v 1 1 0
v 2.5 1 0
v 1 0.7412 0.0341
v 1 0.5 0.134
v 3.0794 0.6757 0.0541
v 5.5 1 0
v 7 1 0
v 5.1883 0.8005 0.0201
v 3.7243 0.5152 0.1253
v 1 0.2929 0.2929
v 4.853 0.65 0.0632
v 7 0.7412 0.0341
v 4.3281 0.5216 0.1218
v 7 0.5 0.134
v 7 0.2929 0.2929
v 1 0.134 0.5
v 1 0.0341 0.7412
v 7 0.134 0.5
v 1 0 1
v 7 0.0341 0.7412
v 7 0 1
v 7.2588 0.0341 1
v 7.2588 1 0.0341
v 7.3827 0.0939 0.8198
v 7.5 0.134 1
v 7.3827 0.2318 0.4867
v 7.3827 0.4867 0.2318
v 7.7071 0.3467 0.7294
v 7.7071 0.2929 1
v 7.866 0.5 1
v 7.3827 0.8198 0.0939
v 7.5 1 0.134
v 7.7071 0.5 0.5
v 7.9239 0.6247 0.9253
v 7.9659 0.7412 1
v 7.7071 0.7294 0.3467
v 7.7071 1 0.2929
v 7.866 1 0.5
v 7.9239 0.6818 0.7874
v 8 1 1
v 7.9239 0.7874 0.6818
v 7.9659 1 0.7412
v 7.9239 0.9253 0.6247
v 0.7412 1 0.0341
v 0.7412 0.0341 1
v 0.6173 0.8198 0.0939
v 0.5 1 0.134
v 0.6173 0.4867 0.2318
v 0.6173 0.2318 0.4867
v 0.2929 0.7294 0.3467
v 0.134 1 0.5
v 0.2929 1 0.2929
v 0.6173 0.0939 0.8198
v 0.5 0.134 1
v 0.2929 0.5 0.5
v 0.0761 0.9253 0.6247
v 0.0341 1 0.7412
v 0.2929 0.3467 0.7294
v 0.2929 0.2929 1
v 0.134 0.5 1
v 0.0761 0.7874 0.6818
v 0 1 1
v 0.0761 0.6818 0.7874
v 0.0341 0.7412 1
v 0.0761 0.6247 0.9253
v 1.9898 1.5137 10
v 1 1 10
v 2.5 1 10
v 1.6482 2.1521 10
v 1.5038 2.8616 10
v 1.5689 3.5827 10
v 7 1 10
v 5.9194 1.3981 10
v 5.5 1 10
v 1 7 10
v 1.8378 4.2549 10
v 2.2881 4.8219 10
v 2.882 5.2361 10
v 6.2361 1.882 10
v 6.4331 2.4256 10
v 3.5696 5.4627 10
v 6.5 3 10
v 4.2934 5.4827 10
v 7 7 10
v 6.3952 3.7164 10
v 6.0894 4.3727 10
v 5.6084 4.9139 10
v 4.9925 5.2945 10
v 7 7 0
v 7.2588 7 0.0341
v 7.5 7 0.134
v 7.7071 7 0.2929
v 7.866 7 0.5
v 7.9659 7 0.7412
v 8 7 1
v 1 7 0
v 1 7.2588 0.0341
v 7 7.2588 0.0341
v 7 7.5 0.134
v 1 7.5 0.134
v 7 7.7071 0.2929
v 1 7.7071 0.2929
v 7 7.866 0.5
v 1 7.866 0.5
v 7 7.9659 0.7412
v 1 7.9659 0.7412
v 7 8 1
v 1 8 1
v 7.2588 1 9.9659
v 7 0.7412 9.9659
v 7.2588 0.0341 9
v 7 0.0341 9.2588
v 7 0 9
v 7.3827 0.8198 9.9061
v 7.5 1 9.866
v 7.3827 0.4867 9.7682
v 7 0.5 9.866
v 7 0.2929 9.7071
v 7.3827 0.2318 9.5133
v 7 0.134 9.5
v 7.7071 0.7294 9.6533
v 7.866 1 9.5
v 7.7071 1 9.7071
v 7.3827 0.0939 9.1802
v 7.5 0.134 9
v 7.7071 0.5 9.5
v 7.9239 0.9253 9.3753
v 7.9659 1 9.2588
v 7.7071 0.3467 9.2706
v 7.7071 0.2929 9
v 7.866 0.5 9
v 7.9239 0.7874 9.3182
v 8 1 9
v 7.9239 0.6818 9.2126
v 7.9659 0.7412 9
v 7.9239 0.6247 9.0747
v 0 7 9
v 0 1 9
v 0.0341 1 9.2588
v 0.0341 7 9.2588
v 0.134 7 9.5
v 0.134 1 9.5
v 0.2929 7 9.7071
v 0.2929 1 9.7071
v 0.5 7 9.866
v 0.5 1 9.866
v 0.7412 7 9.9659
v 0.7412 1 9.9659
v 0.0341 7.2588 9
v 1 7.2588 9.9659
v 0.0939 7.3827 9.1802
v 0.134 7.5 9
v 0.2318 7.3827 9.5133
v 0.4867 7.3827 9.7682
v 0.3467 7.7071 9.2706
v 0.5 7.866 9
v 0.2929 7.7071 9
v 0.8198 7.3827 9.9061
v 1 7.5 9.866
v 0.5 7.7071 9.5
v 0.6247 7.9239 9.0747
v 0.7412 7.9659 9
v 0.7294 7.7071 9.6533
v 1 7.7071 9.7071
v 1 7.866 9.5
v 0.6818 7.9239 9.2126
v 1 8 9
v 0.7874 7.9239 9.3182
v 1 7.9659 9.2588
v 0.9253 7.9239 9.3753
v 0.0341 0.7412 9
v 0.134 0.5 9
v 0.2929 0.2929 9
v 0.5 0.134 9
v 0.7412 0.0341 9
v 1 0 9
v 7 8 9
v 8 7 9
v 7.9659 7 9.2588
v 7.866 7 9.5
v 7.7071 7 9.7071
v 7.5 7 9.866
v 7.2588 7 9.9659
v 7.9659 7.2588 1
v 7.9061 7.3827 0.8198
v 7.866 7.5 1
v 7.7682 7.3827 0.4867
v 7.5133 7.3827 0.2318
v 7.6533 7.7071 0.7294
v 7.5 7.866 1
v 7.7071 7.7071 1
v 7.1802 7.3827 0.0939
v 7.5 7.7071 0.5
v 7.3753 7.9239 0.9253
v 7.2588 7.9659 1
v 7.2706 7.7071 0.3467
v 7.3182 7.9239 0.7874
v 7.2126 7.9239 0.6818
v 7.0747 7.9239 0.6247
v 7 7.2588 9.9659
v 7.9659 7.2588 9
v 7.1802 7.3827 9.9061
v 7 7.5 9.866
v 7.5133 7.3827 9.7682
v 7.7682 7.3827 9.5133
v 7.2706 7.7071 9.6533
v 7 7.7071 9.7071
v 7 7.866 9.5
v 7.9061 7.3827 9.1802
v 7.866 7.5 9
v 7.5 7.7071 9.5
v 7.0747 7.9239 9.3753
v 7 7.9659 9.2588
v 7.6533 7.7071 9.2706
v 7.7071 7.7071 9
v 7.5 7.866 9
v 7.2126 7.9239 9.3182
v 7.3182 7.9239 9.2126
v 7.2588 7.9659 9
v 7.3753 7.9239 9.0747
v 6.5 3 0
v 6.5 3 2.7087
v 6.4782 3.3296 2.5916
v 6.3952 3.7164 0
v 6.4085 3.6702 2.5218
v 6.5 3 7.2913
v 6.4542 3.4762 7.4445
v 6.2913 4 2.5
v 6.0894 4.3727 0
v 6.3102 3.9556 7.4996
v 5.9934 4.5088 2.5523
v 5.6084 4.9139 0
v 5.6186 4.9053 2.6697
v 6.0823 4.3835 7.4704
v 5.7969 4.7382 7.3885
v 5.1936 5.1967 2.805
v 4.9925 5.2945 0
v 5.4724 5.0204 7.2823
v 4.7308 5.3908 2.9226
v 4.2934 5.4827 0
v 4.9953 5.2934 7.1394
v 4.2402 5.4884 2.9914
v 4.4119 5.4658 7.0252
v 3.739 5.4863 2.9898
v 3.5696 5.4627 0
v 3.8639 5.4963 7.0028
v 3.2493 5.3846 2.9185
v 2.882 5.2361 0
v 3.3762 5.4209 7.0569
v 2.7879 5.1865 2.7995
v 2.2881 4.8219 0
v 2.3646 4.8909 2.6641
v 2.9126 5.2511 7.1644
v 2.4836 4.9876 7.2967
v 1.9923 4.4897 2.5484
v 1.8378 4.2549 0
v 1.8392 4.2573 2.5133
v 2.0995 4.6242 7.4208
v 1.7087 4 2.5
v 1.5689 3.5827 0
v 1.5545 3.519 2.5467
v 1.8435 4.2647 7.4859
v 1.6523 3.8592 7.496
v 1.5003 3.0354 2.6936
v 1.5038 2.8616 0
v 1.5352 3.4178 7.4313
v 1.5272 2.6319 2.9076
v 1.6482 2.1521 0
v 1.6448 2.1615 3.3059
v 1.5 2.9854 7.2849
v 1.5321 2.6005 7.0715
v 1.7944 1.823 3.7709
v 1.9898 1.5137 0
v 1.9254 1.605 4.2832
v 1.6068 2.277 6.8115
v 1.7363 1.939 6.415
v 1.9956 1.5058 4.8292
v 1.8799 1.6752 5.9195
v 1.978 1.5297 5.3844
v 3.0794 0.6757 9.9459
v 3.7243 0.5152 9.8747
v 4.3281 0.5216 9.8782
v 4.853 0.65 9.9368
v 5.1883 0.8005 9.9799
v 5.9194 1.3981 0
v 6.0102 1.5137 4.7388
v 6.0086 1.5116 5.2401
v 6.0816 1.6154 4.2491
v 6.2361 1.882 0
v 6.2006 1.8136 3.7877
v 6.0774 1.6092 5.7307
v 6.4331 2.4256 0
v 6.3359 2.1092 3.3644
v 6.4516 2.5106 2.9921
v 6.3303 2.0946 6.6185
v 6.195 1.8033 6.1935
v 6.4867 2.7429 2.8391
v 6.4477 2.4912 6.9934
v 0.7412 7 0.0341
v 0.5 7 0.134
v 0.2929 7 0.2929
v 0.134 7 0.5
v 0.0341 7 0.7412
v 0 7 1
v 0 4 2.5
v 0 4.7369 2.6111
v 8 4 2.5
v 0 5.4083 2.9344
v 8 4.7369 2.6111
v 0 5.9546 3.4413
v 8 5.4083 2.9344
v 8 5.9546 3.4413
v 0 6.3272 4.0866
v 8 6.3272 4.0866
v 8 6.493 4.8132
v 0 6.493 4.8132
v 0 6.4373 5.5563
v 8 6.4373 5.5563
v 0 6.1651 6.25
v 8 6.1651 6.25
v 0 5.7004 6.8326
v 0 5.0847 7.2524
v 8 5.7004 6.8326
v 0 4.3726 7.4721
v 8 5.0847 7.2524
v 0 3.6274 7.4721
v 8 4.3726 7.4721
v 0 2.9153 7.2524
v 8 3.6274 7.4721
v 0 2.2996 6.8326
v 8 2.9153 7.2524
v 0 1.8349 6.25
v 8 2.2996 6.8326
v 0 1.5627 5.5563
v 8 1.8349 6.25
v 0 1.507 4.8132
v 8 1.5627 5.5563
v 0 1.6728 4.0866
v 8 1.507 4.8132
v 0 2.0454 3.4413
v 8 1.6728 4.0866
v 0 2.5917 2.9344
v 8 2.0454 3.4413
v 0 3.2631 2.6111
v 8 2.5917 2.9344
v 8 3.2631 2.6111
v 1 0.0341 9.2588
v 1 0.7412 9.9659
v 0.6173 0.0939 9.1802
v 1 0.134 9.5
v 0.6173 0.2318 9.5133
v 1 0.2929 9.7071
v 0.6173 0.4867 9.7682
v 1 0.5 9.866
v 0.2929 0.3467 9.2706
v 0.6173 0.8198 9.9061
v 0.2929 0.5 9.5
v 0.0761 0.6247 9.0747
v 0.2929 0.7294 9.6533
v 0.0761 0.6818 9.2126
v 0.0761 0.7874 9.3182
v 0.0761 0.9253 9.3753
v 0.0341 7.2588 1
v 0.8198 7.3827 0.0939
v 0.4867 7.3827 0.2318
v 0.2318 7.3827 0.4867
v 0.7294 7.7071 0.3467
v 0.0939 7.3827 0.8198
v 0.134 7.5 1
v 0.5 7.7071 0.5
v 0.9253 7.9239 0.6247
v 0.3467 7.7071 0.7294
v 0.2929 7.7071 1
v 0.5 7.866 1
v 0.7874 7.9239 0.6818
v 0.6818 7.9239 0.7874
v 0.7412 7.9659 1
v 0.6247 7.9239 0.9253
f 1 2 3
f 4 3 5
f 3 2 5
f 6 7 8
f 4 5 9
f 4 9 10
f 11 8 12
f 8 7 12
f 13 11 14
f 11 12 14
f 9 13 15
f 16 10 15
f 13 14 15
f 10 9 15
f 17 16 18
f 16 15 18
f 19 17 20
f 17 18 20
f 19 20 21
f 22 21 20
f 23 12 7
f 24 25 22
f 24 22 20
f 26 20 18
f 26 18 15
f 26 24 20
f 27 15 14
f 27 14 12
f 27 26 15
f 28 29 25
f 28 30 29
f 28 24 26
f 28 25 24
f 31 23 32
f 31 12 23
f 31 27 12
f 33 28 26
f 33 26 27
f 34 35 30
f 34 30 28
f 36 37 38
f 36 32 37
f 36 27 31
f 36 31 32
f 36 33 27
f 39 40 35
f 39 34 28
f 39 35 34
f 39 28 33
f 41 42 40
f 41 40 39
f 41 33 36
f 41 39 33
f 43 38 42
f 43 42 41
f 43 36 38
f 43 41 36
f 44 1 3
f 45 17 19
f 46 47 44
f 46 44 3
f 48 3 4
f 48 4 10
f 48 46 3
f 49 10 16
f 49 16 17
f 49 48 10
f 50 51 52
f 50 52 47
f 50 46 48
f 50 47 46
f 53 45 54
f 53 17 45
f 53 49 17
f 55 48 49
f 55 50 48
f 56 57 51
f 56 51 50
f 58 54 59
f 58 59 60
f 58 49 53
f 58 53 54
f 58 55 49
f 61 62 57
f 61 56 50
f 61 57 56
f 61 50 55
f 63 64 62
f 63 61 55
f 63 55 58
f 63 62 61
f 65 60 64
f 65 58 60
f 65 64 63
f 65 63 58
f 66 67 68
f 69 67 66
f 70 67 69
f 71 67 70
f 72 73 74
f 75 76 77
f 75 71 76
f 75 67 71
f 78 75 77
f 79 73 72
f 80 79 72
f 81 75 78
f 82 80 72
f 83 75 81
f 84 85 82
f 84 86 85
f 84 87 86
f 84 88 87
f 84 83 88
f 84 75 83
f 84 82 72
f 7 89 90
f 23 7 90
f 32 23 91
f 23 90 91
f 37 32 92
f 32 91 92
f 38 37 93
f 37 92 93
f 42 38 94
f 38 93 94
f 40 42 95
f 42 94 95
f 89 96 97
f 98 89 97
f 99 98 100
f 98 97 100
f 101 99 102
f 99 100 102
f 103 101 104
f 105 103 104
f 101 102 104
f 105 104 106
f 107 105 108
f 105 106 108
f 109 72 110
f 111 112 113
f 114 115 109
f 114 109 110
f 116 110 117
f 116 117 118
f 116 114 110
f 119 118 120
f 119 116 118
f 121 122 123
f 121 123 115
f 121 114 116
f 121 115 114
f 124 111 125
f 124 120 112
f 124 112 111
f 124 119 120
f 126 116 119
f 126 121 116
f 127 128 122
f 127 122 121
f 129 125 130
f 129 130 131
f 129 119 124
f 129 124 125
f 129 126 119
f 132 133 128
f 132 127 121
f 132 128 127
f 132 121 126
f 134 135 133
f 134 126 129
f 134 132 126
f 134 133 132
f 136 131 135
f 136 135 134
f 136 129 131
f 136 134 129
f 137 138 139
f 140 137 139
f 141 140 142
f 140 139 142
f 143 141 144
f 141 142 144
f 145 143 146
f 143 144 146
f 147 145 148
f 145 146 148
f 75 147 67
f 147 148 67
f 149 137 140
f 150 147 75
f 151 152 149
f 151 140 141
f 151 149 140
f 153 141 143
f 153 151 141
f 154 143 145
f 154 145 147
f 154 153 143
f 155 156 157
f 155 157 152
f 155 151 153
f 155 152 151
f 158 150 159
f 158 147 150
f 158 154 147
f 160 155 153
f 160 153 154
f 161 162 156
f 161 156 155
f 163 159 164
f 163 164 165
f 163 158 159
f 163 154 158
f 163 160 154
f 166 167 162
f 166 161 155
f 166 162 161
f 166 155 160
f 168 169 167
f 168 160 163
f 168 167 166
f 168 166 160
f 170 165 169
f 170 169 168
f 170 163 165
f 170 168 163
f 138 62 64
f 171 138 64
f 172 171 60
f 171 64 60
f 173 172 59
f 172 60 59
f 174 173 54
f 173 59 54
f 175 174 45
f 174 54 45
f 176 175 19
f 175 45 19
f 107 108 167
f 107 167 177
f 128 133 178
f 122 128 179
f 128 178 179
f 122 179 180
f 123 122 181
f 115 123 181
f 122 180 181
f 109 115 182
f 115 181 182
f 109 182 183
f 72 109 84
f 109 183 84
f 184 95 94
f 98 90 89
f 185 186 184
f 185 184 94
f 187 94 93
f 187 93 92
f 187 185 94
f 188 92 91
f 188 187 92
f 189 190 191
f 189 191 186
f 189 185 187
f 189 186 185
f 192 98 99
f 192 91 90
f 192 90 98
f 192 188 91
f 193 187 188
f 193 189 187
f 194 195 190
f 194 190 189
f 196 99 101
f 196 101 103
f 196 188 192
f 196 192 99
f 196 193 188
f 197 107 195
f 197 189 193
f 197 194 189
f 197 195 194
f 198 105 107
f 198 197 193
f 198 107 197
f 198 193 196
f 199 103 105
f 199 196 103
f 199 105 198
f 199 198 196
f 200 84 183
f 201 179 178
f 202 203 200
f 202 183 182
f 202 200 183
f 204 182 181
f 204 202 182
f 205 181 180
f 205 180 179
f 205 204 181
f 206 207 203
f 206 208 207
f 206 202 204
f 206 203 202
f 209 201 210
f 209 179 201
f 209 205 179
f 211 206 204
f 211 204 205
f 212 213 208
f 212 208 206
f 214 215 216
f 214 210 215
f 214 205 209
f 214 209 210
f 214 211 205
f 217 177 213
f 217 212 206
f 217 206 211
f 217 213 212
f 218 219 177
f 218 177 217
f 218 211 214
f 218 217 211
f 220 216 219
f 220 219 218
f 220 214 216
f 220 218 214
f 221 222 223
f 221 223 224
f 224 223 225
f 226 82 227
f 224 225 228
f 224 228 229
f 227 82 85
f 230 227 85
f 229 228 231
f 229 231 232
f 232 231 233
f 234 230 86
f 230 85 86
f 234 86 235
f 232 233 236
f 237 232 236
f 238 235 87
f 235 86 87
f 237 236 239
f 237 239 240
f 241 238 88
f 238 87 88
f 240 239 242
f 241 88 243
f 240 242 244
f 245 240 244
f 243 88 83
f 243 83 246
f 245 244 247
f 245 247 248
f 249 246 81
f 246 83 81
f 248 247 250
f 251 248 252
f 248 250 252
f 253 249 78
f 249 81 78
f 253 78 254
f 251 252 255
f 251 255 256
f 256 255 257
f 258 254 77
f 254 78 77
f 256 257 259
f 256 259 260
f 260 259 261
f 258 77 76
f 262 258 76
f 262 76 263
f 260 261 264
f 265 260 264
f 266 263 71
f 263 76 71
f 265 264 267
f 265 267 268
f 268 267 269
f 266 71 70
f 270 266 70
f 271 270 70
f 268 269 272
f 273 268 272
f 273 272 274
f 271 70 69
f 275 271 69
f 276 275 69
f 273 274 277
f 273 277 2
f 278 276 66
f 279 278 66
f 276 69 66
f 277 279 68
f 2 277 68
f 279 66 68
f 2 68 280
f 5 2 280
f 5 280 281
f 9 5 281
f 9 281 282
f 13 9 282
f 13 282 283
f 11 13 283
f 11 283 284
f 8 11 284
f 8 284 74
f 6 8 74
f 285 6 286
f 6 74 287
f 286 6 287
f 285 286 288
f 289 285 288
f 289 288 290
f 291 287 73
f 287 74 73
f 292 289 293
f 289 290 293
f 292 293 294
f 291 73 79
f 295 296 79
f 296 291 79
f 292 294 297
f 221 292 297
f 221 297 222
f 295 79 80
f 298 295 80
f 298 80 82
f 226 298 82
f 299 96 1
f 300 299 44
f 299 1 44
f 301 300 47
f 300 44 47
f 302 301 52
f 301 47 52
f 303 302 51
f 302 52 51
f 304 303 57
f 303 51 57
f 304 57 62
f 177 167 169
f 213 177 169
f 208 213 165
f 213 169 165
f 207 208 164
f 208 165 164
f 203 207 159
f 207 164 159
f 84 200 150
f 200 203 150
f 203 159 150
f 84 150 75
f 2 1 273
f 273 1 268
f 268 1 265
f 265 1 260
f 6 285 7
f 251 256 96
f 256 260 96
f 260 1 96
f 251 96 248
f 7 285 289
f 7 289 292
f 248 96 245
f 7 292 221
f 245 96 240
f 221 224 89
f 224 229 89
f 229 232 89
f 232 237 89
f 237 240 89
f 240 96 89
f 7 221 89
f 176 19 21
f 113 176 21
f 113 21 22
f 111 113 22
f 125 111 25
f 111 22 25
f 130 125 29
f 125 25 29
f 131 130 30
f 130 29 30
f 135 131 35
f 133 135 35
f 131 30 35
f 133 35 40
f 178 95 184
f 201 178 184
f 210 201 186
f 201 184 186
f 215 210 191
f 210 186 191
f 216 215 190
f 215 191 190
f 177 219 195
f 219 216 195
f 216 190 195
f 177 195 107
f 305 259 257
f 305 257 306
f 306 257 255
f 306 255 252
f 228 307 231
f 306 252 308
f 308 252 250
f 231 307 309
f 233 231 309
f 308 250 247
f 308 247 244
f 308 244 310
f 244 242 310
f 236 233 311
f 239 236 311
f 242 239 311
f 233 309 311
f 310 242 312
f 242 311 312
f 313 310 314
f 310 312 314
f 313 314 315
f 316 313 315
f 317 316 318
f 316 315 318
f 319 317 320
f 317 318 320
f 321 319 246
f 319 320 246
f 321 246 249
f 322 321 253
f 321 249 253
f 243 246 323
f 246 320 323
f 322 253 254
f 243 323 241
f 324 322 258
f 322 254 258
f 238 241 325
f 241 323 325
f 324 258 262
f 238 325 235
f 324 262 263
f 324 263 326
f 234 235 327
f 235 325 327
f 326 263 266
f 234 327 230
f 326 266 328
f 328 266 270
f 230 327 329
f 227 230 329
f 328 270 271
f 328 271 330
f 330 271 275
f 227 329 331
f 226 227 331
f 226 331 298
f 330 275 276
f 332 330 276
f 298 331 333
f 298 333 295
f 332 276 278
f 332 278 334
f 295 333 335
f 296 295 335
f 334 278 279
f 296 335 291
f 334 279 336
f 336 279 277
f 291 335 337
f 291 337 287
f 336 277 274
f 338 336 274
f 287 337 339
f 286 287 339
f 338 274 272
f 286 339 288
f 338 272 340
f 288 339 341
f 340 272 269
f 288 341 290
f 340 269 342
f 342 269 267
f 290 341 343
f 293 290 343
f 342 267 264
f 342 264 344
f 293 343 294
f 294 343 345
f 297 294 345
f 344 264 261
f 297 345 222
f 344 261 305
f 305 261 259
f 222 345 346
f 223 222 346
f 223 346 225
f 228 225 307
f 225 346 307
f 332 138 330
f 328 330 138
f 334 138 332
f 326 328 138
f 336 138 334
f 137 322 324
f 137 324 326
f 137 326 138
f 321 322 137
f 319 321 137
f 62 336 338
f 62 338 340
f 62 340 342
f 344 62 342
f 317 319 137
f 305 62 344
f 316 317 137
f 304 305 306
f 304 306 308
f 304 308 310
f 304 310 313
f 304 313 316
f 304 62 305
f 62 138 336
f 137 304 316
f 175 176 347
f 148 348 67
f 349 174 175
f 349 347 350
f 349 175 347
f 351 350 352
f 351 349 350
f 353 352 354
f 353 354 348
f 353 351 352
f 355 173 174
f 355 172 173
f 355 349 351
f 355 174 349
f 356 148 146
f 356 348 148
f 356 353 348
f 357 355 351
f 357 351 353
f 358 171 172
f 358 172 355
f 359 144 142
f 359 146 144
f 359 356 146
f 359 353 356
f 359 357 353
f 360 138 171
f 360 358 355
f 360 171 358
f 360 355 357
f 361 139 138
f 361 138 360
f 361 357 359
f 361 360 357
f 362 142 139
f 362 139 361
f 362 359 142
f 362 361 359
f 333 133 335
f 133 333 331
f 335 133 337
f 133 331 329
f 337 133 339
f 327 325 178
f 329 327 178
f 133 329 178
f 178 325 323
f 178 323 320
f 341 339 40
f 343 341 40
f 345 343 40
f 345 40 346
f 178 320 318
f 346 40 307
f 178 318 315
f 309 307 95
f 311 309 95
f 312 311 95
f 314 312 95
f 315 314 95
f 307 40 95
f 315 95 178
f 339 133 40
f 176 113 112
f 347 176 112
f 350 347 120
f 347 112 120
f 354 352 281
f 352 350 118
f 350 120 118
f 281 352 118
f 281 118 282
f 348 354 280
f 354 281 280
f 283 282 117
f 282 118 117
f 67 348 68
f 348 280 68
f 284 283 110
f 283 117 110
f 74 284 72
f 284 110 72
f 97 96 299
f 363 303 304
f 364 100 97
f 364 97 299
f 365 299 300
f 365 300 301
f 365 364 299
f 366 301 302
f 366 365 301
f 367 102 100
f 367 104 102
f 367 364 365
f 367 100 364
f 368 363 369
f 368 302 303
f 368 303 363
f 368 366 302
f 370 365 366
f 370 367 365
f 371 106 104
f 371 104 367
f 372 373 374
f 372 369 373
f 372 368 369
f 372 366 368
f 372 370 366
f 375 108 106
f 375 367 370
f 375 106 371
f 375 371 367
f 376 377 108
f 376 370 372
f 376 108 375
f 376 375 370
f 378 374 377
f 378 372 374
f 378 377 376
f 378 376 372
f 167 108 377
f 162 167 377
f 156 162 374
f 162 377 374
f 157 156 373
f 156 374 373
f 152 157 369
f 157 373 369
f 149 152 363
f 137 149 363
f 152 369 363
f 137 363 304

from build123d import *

# Parameters (mm, degrees)
SKETCH_1_W          = 8
SKETCH_1_H          = 8
EXTRUDE_1_DEPTH     = 10
SKETCH_2_R          = 2.5
CUT_EXTRUDE_1_DEPTH = 16.099668871
SKETCH_4_R          = 2.5
CUT_EXTRUDE_2_DEPTH = 16.099668871
FILLET_1_R          = 1


with BuildPart() as part:
    # 草图1 → 凸台-拉伸1 (new body)
    with BuildSketch(Plane.XY):
        with Locations((4, 4)):
            Rectangle(SKETCH_1_W, SKETCH_1_H)
    extrude(amount=EXTRUDE_1_DEPTH)

    # 草图2 → 切除-拉伸1 (cut, through all)
    with BuildSketch(Plane.XY.offset(10)):
        with Locations((4, 3)):
            Circle(SKETCH_2_R)
    extrude(amount=-CUT_EXTRUDE_1_DEPTH, mode=Mode.SUBTRACT)

    # 草图4 → 切除-拉伸2 (cut, through all)
    with BuildSketch(Plane(origin=(8, 0, 0), x_dir=(0, 0, -1), z_dir=(1, 0, 0))):
        with Locations((-5, 4)):
            Circle(SKETCH_4_R)
    extrude(amount=-CUT_EXTRUDE_2_DEPTH, mode=Mode.SUBTRACT)

    # 圆角1
    # the kernel refuses this fillet: 1 mm, written as the material it takes off along each edge
    with BuildSketch(Plane(origin=(7, 7, 9), x_dir=(1, 0, 0), z_dir=(0, 1, 0))) as fillet_1_piece_1_section:
        Polygon((0, 0), (FILLET_1_R, 0), (FILLET_1_R, -FILLET_1_R), (0, -FILLET_1_R), align=None)
    fillet_1_piece_1 = extrude(amount=FILLET_1_R, mode=Mode.PRIVATE)
    fillet_1_piece_1 = fillet_1_piece_1 - Plane(origin=(7, 7, 9), x_dir=(-0.7071067811865475, 0, -0.7071067811865475), z_dir=(0, 1, 0)) * Sphere(FILLET_1_R, mode=Mode.PRIVATE)
    add(fillet_1_piece_1, mode=Mode.SUBTRACT)
    with BuildSketch(Plane(origin=(7, 1, 9), x_dir=(0, 0, 1), z_dir=(1, 0, 0))) as fillet_1_piece_2_section:
        Polygon((0, 0), (FILLET_1_R, 0), (FILLET_1_R, FILLET_1_R), (0, FILLET_1_R), align=None)
    fillet_1_piece_2 = extrude(amount=FILLET_1_R, mode=Mode.PRIVATE)
    fillet_1_piece_2 = fillet_1_piece_2 - Plane(origin=(7, 1, 9), x_dir=(0, 0.7071067811865475, -0.7071067811865475), z_dir=(1, 0, 0)) * Sphere(FILLET_1_R, mode=Mode.PRIVATE)
    add(fillet_1_piece_2, mode=Mode.SUBTRACT)
    with BuildSketch(Plane(origin=(1, 7, 9), x_dir=(-1, 0, 0), z_dir=(0, 1, 0))) as fillet_1_piece_3_section:
        Polygon((0, 0), (FILLET_1_R, 0), (FILLET_1_R, FILLET_1_R), (0, FILLET_1_R), align=None)
    fillet_1_piece_3 = extrude(amount=FILLET_1_R, mode=Mode.PRIVATE)
    fillet_1_piece_3 = fillet_1_piece_3 - Plane(origin=(1, 7, 9), x_dir=(0.7071067811865475, 0, -0.7071067811865475), z_dir=(0, 1, 0)) * Sphere(FILLET_1_R, mode=Mode.PRIVATE)
    add(fillet_1_piece_3, mode=Mode.SUBTRACT)
    with BuildSketch(Plane(origin=(1, 1, 9), x_dir=(0, 0, 1), z_dir=(-1, 0, 0))) as fillet_1_piece_4_section:
        Polygon((0, 0), (FILLET_1_R, 0), (FILLET_1_R, -FILLET_1_R), (0, -FILLET_1_R), align=None)
    fillet_1_piece_4 = extrude(amount=FILLET_1_R, mode=Mode.PRIVATE)
    fillet_1_piece_4 = fillet_1_piece_4 - Plane(origin=(1, 1, 9), x_dir=(0, 0.7071067811865475, -0.7071067811865475), z_dir=(-1, 0, 0)) * Sphere(FILLET_1_R, mode=Mode.PRIVATE)
    add(fillet_1_piece_4, mode=Mode.SUBTRACT)
    with BuildSketch(Plane(origin=(1, 7, 1), x_dir=(-1, 0, 0), z_dir=(0, 1, 0))) as fillet_1_piece_5_section:
        Polygon((0, 0), (FILLET_1_R, 0), (FILLET_1_R, -FILLET_1_R), (0, -FILLET_1_R), align=None)
    fillet_1_piece_5 = extrude(amount=FILLET_1_R, mode=Mode.PRIVATE)
    fillet_1_piece_5 = fillet_1_piece_5 - Plane(origin=(1, 7, 1), x_dir=(0.7071067811865475, 0, 0.7071067811865475), z_dir=(0, 1, 0)) * Sphere(FILLET_1_R, mode=Mode.PRIVATE)
    add(fillet_1_piece_5, mode=Mode.SUBTRACT)
    with BuildSketch(Plane(origin=(7, 7, 1), x_dir=(1, 0, 0), z_dir=(0, 1, 0))) as fillet_1_piece_6_section:
        Polygon((0, 0), (FILLET_1_R, 0), (FILLET_1_R, FILLET_1_R), (0, FILLET_1_R), align=None)
    fillet_1_piece_6 = extrude(amount=FILLET_1_R, mode=Mode.PRIVATE)
    fillet_1_piece_6 = fillet_1_piece_6 - Plane(origin=(7, 7, 1), x_dir=(-0.7071067811865475, 0, 0.7071067811865475), z_dir=(0, 1, 0)) * Sphere(FILLET_1_R, mode=Mode.PRIVATE)
    add(fillet_1_piece_6, mode=Mode.SUBTRACT)
    with BuildSketch(Plane(origin=(7, 1, 1), x_dir=(0, 0, -1), z_dir=(1, 0, 0))) as fillet_1_piece_7_section:
        Polygon((0, 0), (FILLET_1_R, 0), (FILLET_1_R, -FILLET_1_R), (0, -FILLET_1_R), align=None)
    fillet_1_piece_7 = extrude(amount=FILLET_1_R, mode=Mode.PRIVATE)
    fillet_1_piece_7 = fillet_1_piece_7 - Plane(origin=(7, 1, 1), x_dir=(0, 0.7071067811865475, 0.7071067811865475), z_dir=(1, 0, 0)) * Sphere(FILLET_1_R, mode=Mode.PRIVATE)
    add(fillet_1_piece_7, mode=Mode.SUBTRACT)
    with BuildSketch(Plane(origin=(1, 1, 1), x_dir=(0, 0, -1), z_dir=(-1, 0, 0))) as fillet_1_piece_8_section:
        Polygon((0, 0), (FILLET_1_R, 0), (FILLET_1_R, FILLET_1_R), (0, FILLET_1_R), align=None)
    fillet_1_piece_8 = extrude(amount=FILLET_1_R, mode=Mode.PRIVATE)
    fillet_1_piece_8 = fillet_1_piece_8 - Plane(origin=(1, 1, 1), x_dir=(0, 0.7071067811865475, 0.7071067811865475), z_dir=(-1, 0, 0)) * Sphere(FILLET_1_R, mode=Mode.PRIVATE)
    add(fillet_1_piece_8, mode=Mode.SUBTRACT)
    with BuildSketch(Plane(origin=(8, 7, 10), x_dir=(0, 0, -1), z_dir=(0, -1, 0)), Plane(origin=(1, 8, 10), x_dir=(0, 0, -1), z_dir=(1, 0, 0)), Plane(origin=(0, 1, 10), x_dir=(0, 0, -1), z_dir=(0, 1, 0)), Plane(origin=(7, 0, 0), x_dir=(0, 1, 0), z_dir=(-1, 0, 0))) as fillet_1_piece_9:
        with BuildLine():
            CenterArc((FILLET_1_R, -FILLET_1_R), FILLET_1_R, 90, 90)
            Line((0, -FILLET_1_R), (0, 0))
            Line((0, 0), (FILLET_1_R, 0))
        make_face()
    extrude(amount=6, mode=Mode.SUBTRACT)
    with BuildSketch(Plane(origin=(1, 8, 0), x_dir=(0, 0, 1), z_dir=(1, 0, 0)), Plane(origin=(8, 7, 0), x_dir=(0, 0, 1), z_dir=(0, -1, 0)), Plane(origin=(0, 1, 0), x_dir=(0, 0, 1), z_dir=(0, 1, 0)), Plane(origin=(7, 0, 10), x_dir=(0, 1, 0), z_dir=(-1, 0, 0))) as fillet_1_piece_10:
        with BuildLine():
            CenterArc((FILLET_1_R, FILLET_1_R), FILLET_1_R, 180, 90)
            Line((0, FILLET_1_R), (0, 0))
            Line((0, 0), (FILLET_1_R, 0))
        make_face()
    extrude(amount=6, mode=Mode.SUBTRACT)
    with BuildSketch(Plane(origin=(0, 8, 1), x_dir=(1, 0, 0), z_dir=(0, 0, 1)), Plane(origin=(0, 0, 1), x_dir=(0, 1, 0), z_dir=(0, 0, 1))) as fillet_1_piece_11:
        with BuildLine():
            CenterArc((FILLET_1_R, -FILLET_1_R), FILLET_1_R, 90, 90)
            Line((0, -FILLET_1_R), (0, 0))
            Line((0, 0), (FILLET_1_R, 0))
        make_face()
    extrude(amount=8, mode=Mode.SUBTRACT)
    with BuildSketch(Plane(origin=(8, 8, 1), x_dir=(-1, 0, 0), z_dir=(0, 0, 1)), Plane(origin=(8, 0, 1), x_dir=(0, 1, 0), z_dir=(0, 0, 1))) as fillet_1_piece_12:
        with BuildLine():
            CenterArc((FILLET_1_R, FILLET_1_R), FILLET_1_R, 180, 90)
            Line((0, FILLET_1_R), (0, 0))
            Line((0, 0), (FILLET_1_R, 0))
        make_face()
    extrude(amount=8, mode=Mode.SUBTRACT)


solid = part.part
